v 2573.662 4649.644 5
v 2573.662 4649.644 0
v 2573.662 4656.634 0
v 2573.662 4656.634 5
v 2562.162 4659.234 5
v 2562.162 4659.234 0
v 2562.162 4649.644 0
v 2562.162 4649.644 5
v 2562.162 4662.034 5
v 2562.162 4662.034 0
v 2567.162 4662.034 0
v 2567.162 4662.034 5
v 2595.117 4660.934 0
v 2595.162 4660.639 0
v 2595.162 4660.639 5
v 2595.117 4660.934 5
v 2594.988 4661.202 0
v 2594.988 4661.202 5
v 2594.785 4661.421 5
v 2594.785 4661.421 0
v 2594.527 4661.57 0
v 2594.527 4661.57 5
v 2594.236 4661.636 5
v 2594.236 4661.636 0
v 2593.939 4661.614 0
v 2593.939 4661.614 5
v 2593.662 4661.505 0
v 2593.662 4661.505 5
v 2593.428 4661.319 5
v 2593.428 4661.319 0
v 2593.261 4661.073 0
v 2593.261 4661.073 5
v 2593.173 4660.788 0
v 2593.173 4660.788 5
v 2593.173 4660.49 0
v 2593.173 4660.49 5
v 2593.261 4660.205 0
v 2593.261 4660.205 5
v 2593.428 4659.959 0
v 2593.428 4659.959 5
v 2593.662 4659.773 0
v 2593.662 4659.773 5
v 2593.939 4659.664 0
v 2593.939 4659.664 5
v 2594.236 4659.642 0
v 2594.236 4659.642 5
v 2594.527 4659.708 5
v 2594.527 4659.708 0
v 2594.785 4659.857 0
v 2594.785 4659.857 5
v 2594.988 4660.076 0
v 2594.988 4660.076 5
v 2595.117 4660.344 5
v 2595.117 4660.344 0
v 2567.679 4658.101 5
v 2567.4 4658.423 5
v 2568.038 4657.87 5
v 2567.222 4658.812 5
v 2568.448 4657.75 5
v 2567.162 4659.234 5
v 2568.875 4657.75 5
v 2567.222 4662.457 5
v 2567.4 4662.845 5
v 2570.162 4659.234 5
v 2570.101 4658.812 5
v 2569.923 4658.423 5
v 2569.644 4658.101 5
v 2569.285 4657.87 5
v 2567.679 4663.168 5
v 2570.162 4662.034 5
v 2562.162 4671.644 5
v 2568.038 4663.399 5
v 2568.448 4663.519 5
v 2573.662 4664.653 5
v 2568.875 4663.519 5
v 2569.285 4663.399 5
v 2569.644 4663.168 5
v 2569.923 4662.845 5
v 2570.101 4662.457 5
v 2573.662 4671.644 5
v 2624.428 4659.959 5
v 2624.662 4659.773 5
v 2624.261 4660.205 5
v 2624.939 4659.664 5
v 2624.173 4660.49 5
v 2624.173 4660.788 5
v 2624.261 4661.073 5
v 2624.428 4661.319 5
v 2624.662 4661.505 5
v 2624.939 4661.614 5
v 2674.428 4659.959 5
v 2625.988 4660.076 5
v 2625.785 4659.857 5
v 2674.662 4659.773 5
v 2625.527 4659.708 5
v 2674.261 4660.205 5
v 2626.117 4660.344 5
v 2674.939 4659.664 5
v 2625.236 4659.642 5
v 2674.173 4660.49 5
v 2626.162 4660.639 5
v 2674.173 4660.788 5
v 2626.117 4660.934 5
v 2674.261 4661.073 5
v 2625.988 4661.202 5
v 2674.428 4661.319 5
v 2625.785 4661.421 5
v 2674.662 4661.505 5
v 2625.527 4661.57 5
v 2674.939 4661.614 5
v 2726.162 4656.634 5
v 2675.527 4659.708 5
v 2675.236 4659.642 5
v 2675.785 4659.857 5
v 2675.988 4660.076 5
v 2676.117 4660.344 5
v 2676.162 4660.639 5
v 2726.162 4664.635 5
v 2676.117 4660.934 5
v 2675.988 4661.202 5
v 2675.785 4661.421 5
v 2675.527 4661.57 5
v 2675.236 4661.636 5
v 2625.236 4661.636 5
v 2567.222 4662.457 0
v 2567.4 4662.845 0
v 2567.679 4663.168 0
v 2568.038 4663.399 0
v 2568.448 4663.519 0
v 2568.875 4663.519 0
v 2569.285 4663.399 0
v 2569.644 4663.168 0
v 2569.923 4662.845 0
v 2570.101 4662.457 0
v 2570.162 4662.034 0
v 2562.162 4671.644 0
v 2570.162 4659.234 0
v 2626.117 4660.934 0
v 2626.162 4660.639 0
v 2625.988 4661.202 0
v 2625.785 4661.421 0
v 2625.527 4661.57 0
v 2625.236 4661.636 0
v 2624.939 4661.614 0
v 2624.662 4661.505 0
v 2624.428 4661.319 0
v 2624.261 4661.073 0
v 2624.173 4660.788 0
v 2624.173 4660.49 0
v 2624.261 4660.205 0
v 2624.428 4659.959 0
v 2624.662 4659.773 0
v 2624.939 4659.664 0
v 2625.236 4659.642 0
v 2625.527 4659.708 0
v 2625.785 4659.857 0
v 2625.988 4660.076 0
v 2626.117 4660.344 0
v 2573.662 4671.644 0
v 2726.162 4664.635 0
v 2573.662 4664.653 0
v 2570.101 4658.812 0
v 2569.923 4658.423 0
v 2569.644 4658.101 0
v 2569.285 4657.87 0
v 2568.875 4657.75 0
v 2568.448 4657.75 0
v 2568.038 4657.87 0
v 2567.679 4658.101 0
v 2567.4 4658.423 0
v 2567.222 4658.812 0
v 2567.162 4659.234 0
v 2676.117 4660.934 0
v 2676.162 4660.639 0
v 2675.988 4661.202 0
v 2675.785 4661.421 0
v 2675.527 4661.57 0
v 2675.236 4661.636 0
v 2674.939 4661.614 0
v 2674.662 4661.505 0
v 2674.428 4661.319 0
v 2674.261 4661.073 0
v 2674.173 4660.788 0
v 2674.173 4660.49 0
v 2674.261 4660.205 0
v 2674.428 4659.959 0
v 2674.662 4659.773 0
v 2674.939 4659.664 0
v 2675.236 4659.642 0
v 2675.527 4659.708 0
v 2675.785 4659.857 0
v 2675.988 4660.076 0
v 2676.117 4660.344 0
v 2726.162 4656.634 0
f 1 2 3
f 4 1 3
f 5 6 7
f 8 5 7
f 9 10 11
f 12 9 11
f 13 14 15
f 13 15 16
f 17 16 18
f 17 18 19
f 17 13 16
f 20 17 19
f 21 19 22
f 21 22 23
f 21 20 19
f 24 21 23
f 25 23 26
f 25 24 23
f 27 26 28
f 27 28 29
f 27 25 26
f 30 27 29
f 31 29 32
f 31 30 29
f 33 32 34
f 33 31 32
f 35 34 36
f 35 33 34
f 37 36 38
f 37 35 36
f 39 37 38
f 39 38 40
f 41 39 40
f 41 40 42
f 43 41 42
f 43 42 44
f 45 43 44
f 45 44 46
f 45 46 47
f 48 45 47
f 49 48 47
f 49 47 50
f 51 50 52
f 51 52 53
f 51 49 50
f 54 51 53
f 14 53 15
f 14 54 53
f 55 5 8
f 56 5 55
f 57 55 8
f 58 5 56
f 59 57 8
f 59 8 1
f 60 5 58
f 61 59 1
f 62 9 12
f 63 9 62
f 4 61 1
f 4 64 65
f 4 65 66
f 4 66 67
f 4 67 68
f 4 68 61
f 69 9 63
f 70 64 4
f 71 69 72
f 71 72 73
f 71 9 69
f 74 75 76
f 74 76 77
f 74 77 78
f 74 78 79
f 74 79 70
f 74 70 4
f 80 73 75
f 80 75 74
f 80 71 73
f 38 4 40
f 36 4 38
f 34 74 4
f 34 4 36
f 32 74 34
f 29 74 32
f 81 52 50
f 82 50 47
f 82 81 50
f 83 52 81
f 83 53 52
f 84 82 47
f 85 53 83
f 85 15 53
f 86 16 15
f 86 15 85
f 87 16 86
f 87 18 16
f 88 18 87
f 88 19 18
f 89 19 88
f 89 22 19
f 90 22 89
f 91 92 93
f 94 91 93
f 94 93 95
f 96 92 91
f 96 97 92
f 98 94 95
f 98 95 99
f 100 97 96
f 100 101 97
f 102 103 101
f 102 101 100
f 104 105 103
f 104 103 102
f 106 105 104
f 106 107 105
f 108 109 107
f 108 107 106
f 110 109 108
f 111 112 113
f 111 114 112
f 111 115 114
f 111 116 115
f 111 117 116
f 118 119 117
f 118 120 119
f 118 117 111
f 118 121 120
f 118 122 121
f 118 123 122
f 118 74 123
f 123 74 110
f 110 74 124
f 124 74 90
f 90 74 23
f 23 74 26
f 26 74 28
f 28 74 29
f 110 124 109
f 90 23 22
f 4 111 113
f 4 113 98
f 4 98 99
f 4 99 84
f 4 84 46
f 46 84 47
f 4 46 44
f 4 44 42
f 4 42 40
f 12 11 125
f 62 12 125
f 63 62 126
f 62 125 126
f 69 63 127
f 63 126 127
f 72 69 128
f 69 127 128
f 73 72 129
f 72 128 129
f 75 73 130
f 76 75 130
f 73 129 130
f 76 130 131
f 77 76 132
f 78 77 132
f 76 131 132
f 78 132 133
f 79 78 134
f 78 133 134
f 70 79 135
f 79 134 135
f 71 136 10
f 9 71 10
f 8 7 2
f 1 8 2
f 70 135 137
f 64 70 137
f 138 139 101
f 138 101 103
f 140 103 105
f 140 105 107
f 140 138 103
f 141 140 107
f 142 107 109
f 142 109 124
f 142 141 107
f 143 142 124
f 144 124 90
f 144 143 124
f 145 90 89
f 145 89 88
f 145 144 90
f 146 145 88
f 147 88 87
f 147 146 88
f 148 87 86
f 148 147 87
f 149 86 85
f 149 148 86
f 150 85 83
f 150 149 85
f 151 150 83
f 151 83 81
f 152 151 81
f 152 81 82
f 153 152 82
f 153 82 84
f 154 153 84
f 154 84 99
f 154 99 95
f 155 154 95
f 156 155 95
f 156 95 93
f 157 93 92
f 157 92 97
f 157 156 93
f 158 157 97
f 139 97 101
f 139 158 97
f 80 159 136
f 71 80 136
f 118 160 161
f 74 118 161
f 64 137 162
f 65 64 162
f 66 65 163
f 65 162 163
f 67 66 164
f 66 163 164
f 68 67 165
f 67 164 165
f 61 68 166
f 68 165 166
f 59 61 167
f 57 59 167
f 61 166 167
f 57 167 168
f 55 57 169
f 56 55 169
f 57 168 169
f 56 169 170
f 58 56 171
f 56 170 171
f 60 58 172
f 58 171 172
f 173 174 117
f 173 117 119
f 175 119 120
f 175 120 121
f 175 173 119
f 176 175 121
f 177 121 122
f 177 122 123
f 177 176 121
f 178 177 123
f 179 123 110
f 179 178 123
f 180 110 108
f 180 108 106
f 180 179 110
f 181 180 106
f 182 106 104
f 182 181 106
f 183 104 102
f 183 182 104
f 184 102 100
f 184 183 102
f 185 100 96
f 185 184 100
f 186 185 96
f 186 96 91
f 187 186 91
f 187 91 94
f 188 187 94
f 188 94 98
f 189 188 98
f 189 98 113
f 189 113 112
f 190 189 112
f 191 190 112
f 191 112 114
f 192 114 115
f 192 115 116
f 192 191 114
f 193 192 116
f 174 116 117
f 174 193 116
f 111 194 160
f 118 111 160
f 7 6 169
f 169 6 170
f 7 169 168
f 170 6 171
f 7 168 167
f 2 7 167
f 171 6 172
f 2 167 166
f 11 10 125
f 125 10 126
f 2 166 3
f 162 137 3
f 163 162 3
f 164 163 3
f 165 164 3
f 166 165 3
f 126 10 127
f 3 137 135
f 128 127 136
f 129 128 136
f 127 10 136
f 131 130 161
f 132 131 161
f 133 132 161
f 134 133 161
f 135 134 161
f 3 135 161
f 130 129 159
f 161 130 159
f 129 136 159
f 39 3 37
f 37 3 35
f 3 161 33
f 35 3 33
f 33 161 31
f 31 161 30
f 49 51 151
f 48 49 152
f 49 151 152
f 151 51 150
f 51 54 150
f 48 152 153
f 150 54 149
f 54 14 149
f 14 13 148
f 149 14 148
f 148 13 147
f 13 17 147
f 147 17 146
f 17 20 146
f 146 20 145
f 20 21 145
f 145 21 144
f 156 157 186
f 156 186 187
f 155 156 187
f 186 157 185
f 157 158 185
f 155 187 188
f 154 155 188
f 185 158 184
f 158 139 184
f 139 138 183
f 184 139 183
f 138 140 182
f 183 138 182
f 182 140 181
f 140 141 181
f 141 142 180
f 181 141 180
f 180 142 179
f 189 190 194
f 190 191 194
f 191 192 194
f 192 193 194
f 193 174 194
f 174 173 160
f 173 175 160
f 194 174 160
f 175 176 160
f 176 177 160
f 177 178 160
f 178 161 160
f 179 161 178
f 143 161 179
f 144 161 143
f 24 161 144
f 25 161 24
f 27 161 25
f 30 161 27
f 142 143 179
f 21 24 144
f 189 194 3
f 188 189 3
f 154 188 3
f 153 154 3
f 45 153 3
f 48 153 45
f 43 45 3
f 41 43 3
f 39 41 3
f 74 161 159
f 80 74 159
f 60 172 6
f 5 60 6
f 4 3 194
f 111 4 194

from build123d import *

# Parameters (mm, degrees)
SKETCH_3_R      = 1
EXTRUDE_3_DEPTH = 5


with BuildPart() as part:
    # 草图3 → 凸台-拉伸3 (new body)
    with BuildSketch(Plane.XY):
        with BuildLine():
            Line((2726.161531979, 4664.634627263), (2573.661531979, 4664.653356317))
            Line((2573.661531979, 4664.653356317), (2573.661531979, 4671.643884914))
            Line((2573.661531979, 4671.643884914), (2562.161531979, 4671.643884914))
            Line((2562.161531979, 4671.643884914), (2562.161531979, 4662.034400913))
            Line((2562.161531979, 4662.034400913), (2567.161531979, 4662.034400913))
            ThreePointArc((2567.161531979, 4662.034400913), (2568.661531979, 4663.534400913), (2570.161531979, 4662.034400913))
            Line((2570.161531979, 4662.034400913), (2570.161531979, 4659.234400913))
            ThreePointArc((2570.161531979, 4659.234400913), (2568.661531979, 4657.734400913), (2567.161531979, 4659.234400913))
            Line((2567.161531979, 4659.234400913), (2562.161531979, 4659.234400913))
            Line((2562.161531979, 4659.234400913), (2562.161531979, 4649.791778919))
            Line((2562.161531979, 4649.791778919), (2562.161531979, 4649.643884914))
            Line((2562.161531979, 4649.643884914), (2573.661531979, 4649.643884914))
            Line((2573.661531979, 4649.643884914), (2573.661531979, 4656.634400913))
            Line((2573.661531979, 4656.634400913), (2726.161531979, 4656.634400913))
            Line((2726.161531979, 4656.634400913), (2726.161531979, 4664.634627263))
        make_face()
        with Locations((2594.161531979, 4660.639111823)):
            Circle(SKETCH_3_R, mode=Mode.SUBTRACT)
        with Locations((2625.161531979, 4660.639111823)):
            Circle(SKETCH_3_R, mode=Mode.SUBTRACT)
        with Locations((2675.161531979, 4660.639111823)):
            Circle(SKETCH_3_R, mode=Mode.SUBTRACT)
    extrude(amount=EXTRUDE_3_DEPTH)


solid = part.part
